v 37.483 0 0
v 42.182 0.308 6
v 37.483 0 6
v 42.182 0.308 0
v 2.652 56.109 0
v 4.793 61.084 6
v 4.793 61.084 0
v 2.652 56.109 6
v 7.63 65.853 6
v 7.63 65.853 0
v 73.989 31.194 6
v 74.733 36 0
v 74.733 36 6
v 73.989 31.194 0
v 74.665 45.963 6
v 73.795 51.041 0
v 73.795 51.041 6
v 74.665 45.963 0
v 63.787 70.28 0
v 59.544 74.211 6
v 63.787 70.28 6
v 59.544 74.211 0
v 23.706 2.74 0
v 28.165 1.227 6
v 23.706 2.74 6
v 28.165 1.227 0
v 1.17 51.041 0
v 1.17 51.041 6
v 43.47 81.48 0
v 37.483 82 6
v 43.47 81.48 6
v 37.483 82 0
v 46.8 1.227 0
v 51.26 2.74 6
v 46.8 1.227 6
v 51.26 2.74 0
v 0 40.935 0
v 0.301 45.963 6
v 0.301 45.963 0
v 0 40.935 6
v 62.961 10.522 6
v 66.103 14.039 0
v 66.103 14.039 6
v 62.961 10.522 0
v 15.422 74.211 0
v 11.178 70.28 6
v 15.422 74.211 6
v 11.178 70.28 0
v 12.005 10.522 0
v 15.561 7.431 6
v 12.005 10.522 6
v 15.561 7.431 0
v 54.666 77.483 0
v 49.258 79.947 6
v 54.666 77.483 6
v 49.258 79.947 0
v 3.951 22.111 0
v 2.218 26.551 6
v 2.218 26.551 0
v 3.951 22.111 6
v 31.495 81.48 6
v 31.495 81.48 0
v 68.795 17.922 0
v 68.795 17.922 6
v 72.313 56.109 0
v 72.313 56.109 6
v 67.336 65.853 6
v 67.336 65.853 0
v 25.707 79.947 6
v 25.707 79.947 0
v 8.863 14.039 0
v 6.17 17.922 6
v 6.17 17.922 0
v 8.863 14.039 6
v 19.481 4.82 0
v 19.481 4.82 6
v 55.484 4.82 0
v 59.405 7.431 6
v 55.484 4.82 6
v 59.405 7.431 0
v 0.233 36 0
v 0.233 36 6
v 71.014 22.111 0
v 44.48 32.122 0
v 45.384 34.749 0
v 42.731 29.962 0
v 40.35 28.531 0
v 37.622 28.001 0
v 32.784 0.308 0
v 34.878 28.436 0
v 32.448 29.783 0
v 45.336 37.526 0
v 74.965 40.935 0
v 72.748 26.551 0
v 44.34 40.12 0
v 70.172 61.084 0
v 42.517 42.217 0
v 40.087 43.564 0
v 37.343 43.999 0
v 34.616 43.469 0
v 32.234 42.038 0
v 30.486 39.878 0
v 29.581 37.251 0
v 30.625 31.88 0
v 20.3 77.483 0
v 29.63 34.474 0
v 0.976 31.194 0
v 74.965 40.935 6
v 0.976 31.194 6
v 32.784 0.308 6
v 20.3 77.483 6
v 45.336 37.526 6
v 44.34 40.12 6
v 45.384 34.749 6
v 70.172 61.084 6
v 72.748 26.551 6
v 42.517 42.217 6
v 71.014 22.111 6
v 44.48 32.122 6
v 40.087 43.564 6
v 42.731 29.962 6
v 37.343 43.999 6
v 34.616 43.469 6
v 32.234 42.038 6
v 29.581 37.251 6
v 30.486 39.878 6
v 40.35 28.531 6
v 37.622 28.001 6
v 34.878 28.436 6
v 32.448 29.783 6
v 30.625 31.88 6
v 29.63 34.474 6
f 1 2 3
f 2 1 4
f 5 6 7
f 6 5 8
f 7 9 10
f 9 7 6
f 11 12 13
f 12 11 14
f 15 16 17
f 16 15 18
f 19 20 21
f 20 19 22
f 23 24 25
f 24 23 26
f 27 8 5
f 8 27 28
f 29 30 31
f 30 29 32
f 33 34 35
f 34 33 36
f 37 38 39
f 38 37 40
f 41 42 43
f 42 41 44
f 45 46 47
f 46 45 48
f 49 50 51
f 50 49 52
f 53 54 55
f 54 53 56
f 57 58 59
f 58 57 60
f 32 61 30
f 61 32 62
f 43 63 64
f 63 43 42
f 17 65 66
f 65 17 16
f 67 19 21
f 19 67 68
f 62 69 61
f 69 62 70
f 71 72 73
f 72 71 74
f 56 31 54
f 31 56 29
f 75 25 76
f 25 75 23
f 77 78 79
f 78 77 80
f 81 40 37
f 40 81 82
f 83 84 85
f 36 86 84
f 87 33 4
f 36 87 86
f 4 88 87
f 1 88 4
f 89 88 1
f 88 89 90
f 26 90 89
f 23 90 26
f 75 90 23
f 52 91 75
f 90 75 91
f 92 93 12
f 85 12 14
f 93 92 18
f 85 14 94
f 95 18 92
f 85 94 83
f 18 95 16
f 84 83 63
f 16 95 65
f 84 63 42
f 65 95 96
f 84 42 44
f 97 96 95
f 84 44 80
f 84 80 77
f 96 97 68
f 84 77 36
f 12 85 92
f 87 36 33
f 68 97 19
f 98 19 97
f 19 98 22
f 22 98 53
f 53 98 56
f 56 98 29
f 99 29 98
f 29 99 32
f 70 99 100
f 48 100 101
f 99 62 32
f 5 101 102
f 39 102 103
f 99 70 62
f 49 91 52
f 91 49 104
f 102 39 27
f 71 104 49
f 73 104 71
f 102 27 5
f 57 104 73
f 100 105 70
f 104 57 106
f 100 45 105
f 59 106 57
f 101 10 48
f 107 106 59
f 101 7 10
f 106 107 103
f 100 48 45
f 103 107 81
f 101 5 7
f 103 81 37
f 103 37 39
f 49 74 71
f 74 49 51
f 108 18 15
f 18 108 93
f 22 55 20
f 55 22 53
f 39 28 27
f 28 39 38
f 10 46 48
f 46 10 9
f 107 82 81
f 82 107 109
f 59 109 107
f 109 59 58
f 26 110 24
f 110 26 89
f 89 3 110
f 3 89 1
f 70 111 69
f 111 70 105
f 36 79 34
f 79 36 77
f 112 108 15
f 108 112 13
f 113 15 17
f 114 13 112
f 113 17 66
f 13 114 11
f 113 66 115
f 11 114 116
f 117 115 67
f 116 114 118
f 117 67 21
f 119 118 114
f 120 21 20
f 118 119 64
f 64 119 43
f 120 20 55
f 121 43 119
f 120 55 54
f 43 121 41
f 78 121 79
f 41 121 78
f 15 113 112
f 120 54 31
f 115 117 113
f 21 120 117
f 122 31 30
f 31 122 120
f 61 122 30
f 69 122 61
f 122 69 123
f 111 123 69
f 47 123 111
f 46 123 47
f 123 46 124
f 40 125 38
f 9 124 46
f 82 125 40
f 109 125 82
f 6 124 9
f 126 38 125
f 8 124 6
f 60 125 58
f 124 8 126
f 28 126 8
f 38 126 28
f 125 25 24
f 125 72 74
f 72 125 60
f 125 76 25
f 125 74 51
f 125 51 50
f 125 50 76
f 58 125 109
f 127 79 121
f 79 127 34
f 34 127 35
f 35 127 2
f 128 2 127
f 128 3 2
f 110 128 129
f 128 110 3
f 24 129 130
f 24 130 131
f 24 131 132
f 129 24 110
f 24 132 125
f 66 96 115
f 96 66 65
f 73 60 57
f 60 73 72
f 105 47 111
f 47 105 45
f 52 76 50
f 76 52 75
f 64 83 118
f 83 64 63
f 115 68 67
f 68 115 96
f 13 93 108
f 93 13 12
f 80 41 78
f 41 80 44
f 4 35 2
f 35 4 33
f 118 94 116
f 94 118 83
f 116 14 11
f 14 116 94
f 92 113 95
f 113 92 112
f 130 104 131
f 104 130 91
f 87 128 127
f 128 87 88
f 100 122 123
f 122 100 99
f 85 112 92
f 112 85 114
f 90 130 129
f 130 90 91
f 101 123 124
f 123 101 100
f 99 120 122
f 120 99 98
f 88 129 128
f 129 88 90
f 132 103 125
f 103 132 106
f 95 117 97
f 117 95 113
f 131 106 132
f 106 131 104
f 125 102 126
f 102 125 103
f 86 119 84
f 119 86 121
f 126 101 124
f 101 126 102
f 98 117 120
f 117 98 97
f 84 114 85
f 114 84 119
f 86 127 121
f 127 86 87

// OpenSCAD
$fn = 32;

// ----------------------------------------------------------------------
// Cam plate: single_lobe cam, base R36
// ----------------------------------------------------------------------

// --- parameters (mm) ---
base_r = 36;              // base circle radius
lobe_h = 10;              // cam lobe rise
bore_r = 8;               // shaft bore radius
plate_t = 6;              // plate thickness, Z (extrusion height)

profile = [[74.733, 36], [74.965, 40.935], [74.665, 45.963], [73.795, 51.041], [72.313, 56.109], [70.172, 61.084], [67.336, 65.853], [63.787, 70.28], [59.544, 74.211], [54.666, 77.483], [49.258, 79.947], [43.47, 81.48], [37.483, 82], [31.495, 81.48], [25.707, 79.947], [20.3, 77.483], [15.422, 74.211], [11.178, 70.28], [7.63, 65.853], [4.793, 61.084], [2.652, 56.109], [1.17, 51.041], [0.301, 45.963], [0, 40.935], [0.233, 36], [0.976, 31.194], [2.218, 26.551], [3.951, 22.111], [6.17, 17.922], [8.863, 14.039], [12.005, 10.522], [15.561, 7.431], [19.481, 4.82], [23.706, 2.74], [28.165, 1.227], [32.784, 0.308], [37.483, 0], [42.182, 0.308], [46.8, 1.227], [51.26, 2.74], [55.484, 4.82], [59.405, 7.431], [62.961, 10.522], [66.103, 14.039], [68.795, 17.922], [71.014, 22.111], [72.748, 26.551], [73.989, 31.194]];  // primary outline, 48 points, counter clockwise
void_1 = [[45.336, 37.526], [44.34, 40.12], [42.517, 42.217], [40.087, 43.564], [37.343, 43.999], [34.616, 43.469], [32.234, 42.038], [30.486, 39.878], [29.581, 37.251], [29.63, 34.474], [30.625, 31.88], [32.448, 29.783], [34.878, 28.436], [37.622, 28.001], [40.35, 28.531], [42.731, 29.962], [44.48, 32.122], [45.384, 34.749]];  // shaft bore, 18 points

// --- the one profile operation ---
difference() {
  linear_extrude(height = plate_t) polygon(points = profile);
  translate([0, 0, -1])
    linear_extrude(height = plate_t + 2) polygon(points = void_1);
}
